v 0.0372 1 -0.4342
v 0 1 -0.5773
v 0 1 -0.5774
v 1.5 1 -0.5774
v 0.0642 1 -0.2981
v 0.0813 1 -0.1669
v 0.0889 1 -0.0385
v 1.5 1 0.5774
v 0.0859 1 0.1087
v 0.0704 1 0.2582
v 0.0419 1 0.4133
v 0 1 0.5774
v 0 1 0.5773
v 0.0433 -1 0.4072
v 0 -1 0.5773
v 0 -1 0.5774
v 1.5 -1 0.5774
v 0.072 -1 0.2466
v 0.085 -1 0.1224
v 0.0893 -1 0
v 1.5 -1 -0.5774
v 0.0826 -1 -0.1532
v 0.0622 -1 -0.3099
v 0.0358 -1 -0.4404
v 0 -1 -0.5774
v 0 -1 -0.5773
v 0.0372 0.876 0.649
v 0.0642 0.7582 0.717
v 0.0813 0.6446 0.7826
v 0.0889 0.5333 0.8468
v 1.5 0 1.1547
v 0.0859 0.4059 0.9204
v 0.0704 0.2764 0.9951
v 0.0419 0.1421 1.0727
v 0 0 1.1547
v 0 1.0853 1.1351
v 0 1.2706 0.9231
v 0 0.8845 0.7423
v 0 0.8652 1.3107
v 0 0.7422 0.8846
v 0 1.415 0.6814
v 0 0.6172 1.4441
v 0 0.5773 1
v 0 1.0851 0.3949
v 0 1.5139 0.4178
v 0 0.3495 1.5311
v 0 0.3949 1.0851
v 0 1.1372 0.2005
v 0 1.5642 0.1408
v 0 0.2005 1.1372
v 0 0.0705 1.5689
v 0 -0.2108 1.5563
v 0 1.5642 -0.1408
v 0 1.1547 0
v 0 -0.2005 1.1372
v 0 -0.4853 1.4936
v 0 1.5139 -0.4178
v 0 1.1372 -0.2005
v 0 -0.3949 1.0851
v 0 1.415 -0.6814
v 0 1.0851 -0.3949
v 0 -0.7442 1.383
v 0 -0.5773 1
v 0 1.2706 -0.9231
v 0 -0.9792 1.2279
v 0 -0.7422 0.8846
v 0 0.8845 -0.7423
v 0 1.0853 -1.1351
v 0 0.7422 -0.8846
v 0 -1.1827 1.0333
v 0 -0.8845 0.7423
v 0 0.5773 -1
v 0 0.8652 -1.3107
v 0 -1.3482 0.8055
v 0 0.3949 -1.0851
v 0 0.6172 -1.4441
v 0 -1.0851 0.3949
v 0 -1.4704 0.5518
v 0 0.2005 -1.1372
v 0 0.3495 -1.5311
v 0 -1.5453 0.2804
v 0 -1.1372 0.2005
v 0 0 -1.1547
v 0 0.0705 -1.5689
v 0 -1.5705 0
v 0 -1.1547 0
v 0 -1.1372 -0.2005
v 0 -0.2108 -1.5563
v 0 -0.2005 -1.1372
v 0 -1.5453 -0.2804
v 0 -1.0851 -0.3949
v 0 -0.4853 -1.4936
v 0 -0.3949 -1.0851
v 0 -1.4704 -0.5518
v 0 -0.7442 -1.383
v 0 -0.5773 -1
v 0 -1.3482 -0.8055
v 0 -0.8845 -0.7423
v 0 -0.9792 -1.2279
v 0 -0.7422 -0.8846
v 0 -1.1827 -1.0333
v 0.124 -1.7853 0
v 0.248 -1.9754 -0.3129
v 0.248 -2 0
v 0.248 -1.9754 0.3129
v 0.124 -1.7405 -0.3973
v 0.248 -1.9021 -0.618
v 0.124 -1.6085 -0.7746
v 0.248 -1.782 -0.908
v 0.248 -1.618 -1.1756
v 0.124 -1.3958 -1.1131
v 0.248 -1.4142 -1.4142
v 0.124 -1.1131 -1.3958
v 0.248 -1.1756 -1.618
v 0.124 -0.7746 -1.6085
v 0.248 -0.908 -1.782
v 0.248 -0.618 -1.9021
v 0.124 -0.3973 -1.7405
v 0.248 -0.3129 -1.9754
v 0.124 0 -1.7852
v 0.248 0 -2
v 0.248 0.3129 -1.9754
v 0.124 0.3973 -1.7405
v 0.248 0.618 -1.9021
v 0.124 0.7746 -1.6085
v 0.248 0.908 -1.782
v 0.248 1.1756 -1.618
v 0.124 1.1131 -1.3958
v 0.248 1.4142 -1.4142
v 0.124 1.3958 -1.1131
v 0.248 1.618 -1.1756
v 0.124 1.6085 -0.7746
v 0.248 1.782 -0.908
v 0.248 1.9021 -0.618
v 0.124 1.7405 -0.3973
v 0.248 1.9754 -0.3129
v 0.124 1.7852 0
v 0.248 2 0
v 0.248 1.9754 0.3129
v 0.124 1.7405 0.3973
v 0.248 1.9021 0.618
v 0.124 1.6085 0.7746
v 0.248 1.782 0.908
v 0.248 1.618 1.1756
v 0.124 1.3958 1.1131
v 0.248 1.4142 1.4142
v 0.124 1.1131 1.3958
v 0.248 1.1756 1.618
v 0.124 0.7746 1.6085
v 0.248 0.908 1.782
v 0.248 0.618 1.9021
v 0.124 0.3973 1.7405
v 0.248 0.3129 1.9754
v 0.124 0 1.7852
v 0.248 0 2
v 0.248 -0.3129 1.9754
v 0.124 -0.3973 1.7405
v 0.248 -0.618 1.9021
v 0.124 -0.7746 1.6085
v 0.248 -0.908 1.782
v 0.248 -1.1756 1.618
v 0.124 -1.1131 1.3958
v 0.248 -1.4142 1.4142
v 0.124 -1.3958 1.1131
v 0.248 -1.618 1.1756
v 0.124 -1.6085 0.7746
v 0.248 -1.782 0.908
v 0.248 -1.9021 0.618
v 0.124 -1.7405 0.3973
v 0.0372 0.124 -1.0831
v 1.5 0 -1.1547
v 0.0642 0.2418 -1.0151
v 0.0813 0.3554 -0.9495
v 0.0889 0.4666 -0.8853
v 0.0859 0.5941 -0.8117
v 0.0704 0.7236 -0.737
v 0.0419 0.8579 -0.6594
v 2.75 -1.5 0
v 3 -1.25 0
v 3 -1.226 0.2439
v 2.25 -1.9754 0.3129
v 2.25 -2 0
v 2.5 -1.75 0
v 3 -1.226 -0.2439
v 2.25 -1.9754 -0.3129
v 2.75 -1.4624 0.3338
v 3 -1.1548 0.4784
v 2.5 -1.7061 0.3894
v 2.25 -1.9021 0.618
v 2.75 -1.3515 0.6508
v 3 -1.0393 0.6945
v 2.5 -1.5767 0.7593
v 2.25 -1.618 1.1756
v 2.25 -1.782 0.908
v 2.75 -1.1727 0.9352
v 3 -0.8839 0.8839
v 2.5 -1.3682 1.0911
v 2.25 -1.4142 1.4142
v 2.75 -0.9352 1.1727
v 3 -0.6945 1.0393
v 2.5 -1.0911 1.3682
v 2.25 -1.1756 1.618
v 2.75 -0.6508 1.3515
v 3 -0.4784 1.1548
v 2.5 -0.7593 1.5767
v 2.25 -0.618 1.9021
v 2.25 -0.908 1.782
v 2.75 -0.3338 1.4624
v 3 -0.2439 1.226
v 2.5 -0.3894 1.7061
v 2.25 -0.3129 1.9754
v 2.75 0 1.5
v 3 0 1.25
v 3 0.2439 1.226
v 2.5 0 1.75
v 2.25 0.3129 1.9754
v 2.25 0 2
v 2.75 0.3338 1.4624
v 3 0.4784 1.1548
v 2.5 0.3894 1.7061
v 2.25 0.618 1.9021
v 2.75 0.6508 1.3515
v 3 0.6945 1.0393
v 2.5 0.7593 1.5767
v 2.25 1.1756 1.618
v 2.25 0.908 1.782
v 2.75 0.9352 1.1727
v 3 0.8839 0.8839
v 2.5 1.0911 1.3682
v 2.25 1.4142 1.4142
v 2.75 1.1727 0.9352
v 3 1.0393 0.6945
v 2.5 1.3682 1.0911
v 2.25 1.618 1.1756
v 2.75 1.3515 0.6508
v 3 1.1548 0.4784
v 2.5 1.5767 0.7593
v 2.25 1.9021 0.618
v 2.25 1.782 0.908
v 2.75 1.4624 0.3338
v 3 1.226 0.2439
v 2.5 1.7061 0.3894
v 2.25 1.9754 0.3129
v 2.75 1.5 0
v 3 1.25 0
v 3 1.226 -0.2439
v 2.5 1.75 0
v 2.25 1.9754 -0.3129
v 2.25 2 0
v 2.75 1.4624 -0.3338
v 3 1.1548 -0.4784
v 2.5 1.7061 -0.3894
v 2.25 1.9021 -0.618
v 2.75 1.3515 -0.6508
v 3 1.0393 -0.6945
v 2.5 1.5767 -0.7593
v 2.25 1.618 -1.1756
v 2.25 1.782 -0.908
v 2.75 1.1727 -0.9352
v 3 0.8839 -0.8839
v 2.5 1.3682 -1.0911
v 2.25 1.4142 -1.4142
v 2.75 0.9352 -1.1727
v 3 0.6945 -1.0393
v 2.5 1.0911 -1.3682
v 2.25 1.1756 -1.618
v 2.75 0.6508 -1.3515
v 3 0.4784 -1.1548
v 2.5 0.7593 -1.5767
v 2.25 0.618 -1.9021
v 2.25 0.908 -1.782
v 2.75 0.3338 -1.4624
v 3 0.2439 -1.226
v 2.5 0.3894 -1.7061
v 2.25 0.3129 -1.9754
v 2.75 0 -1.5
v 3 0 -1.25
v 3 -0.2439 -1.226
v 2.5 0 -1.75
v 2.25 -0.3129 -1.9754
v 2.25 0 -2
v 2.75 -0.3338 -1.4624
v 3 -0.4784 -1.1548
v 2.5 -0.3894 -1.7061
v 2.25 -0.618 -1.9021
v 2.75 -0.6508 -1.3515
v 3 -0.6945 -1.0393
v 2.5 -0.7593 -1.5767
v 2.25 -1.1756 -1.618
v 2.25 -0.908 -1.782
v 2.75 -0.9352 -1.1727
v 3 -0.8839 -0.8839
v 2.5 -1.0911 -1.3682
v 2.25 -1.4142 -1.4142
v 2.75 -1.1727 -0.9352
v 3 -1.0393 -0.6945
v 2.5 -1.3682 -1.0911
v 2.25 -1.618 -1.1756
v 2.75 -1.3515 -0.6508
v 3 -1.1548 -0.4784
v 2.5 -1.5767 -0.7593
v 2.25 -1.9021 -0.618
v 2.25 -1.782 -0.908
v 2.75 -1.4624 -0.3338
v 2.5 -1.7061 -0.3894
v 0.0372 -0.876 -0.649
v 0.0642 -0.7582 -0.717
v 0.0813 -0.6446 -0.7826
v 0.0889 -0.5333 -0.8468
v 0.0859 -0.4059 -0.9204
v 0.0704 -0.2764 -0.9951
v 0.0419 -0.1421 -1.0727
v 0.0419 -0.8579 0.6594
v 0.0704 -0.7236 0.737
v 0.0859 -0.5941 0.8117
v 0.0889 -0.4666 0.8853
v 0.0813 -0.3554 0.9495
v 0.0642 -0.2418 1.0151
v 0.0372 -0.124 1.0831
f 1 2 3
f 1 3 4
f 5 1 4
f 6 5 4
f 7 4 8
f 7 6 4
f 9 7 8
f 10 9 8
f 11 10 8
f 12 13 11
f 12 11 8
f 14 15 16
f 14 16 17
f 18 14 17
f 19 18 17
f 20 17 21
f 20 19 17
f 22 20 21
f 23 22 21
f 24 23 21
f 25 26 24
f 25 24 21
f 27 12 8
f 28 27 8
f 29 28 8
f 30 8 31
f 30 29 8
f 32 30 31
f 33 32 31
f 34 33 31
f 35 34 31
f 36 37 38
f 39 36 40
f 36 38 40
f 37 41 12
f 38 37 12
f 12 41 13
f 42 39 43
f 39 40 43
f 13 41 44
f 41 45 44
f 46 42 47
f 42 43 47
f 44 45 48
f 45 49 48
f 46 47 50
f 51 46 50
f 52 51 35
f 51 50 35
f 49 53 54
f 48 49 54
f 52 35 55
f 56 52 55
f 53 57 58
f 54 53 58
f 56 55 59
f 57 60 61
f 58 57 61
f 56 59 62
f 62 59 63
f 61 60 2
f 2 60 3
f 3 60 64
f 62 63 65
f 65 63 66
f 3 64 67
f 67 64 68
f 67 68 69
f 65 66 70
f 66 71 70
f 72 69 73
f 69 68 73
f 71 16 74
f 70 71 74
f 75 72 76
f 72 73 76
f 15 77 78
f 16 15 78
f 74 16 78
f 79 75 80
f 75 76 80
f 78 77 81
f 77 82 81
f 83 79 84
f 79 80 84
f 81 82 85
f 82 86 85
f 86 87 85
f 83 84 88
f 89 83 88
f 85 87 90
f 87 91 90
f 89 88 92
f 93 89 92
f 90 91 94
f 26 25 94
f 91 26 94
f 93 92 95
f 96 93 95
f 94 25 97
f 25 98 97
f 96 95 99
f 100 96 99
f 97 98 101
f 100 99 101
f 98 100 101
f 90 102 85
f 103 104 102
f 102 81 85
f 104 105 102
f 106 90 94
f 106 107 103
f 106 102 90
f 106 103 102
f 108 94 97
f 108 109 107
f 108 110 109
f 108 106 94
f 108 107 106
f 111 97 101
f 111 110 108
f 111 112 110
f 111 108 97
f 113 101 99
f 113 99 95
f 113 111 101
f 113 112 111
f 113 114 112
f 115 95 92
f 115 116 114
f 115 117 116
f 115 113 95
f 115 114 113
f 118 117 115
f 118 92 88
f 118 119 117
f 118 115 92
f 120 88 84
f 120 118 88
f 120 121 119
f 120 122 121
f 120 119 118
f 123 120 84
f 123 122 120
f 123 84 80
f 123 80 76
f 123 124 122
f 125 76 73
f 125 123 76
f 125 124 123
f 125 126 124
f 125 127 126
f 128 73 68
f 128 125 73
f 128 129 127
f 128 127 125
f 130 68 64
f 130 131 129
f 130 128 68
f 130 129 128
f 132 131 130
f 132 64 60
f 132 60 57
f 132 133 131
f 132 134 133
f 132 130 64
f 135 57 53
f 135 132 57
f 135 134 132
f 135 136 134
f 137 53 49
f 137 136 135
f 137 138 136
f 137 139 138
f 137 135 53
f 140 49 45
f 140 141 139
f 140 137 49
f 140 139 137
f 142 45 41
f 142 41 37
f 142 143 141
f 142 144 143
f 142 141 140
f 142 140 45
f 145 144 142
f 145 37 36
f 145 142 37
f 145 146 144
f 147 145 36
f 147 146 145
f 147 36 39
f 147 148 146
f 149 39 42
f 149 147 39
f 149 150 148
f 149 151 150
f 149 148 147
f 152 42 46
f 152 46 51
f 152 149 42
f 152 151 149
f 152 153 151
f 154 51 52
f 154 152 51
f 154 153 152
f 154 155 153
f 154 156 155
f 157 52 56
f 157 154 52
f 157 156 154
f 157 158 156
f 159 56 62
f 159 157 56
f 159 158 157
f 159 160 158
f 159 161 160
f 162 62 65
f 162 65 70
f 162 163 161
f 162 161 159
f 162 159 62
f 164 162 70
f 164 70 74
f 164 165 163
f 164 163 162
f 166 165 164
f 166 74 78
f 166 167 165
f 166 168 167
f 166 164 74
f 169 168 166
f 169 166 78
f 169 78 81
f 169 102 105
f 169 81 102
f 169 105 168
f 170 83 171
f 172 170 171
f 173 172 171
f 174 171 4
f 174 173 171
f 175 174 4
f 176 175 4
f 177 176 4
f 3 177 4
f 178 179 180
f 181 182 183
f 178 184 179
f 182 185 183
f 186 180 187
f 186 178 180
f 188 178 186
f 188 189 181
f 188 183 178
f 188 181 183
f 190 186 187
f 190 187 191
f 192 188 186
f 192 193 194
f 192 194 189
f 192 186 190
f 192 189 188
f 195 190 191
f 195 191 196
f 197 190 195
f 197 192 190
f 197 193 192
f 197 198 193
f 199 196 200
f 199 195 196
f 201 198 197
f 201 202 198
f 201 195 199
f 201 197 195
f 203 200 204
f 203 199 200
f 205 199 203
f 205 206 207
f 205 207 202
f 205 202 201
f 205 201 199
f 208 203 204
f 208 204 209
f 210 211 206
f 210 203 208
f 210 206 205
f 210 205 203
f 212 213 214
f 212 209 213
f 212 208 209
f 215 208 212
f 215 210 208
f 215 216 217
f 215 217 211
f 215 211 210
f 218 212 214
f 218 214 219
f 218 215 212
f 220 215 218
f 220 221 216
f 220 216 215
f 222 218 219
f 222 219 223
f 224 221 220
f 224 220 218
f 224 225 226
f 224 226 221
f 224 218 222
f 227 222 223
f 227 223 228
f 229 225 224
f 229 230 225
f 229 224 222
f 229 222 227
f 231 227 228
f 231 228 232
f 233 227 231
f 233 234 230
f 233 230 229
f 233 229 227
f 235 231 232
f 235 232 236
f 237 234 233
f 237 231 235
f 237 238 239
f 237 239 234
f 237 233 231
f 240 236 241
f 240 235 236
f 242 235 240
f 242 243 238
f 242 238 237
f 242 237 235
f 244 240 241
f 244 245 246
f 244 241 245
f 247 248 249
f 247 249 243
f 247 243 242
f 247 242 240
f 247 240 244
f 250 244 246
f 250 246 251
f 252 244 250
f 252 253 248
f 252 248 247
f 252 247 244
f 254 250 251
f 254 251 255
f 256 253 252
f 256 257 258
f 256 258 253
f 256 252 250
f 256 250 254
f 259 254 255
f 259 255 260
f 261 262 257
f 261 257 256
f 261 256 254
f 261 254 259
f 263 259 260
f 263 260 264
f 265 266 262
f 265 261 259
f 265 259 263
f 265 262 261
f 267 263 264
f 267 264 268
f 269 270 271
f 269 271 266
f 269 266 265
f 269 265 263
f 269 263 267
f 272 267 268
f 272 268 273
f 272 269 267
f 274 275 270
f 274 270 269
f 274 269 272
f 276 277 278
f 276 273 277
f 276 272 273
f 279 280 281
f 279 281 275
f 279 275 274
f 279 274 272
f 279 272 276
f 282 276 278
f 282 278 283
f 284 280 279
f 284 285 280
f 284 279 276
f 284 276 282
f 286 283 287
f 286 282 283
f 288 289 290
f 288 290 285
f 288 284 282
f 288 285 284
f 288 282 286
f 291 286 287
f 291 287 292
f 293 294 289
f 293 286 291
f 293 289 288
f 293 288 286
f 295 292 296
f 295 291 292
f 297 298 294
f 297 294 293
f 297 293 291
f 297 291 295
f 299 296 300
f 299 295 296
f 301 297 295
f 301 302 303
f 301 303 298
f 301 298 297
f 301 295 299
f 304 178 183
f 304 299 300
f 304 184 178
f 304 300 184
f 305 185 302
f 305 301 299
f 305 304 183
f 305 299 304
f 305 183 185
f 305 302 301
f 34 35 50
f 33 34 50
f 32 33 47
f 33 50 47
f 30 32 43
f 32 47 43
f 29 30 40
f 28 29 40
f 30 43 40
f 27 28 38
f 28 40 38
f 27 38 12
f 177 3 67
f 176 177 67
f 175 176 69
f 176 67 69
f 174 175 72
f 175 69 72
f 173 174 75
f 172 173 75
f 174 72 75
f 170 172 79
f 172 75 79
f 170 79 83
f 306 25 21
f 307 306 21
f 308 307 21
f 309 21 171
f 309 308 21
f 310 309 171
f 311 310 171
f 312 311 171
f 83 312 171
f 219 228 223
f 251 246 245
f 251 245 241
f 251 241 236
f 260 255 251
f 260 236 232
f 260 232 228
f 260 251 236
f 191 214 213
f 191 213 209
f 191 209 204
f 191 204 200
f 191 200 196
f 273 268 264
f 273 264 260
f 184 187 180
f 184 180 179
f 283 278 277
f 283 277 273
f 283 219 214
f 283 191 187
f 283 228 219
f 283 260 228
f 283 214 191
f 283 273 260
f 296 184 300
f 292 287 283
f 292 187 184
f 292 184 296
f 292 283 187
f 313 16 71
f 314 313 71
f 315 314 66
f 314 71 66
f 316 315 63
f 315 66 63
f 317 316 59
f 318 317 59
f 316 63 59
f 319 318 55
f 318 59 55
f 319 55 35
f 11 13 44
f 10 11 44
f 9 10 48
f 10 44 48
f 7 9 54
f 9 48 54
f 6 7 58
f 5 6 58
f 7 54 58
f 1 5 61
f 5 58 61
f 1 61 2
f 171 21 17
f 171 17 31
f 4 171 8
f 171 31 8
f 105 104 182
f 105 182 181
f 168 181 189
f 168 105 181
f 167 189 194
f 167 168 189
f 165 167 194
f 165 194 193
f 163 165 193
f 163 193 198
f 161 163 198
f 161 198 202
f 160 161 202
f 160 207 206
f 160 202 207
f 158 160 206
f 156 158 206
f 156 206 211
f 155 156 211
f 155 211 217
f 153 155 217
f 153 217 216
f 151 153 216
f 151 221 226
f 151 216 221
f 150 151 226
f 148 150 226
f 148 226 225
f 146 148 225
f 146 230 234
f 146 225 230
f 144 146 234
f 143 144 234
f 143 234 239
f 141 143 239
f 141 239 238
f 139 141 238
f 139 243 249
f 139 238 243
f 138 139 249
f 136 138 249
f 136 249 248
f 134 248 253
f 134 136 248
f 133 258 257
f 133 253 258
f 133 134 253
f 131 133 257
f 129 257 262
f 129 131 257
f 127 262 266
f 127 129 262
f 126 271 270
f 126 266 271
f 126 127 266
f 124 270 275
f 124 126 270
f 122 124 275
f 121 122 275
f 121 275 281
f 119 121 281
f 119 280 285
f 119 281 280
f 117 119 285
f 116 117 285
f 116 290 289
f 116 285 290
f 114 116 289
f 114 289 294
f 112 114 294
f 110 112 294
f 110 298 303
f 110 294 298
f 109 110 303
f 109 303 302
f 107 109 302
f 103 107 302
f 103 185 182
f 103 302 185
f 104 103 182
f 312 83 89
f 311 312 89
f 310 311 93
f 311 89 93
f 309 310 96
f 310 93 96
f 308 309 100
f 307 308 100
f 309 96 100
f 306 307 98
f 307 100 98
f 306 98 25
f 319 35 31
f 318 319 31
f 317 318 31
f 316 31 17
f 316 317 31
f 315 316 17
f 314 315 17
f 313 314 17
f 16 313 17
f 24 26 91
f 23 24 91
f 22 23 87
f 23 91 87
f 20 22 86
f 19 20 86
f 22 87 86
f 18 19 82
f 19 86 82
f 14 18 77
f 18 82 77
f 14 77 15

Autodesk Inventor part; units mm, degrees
sketch "Sketch_1" plane through (0, 0, 0) normal (0, 0, 1) x (1, 0, 0)
  line L0 (0.6667, 0) -> (3, 0)
  line L1 (3, 0) -> (3, -1.25)
  line L2 (3, -1.25) -> (2.25, -2)
  line L3 (2.25, -2) -> (0.248, -2)
  line L4 (0.248, -2) -> (0, -1.5705)
  line L5 (0, -1.5705) -> (0, -1.1547)
  line L6 (0, -1.1547) -> (0.6667, 0)
  line L7 (0.6667, 0) -> (3, 0)
revolve "Revolution1" add sketch "Sketch_1" angle 360 about axis through (0.6667, 0, 0) along (1, 0, 0)
thread "Thread1" size "M4x0.7" class "6g" standard "ISO Metric profile" full length
sketch "Sketch_2" plane through (0, 0, 0) normal (1, 0, 0) x (0, 1, 0)
  line L0 (0, 1.1547) -> (-1, 0.5774)
  line L1 (-1, 0.5774) -> (-1, -0.5774)
  line L2 (-1, -0.5774) -> (0, -1.1547)
  line L3 (0, -1.1547) -> (1, -0.5774)
  line L4 (1, -0.5774) -> (1, 0.5774)
  line L5 (1, 0.5774) -> (0, 1.1547)
extrude "Extrusion1" cut sketch "Sketch_2" along normal blind 1.5
ref_plane "IP1_XY" through (0, 0, 0) normal (1, 0, 0) x (0, 0, -1)
ref_plane "IP1_YZ" through (0, 0, 0) normal (0, 0, -1) x (0, 1, 0)
ref_plane "IP1_ZX" through (0, 0, 0) normal (0, 1, 0) x (1, 0, 0)
ref_plane "IP2_XY" through (3, 0, 0) normal (1, 0, 0) x (0, 0, -1)
ref_plane "IP2_YZ" through (3, 0, 0) normal (0, 0, -1) x (0, 1, 0)
ref_plane "IP2_ZX" through (3, 0, 0) normal (0, 1, 0) x (1, 0, 0)
properties part number "Hexagon socket set screw with flat point DIN 913 - M4x3"
